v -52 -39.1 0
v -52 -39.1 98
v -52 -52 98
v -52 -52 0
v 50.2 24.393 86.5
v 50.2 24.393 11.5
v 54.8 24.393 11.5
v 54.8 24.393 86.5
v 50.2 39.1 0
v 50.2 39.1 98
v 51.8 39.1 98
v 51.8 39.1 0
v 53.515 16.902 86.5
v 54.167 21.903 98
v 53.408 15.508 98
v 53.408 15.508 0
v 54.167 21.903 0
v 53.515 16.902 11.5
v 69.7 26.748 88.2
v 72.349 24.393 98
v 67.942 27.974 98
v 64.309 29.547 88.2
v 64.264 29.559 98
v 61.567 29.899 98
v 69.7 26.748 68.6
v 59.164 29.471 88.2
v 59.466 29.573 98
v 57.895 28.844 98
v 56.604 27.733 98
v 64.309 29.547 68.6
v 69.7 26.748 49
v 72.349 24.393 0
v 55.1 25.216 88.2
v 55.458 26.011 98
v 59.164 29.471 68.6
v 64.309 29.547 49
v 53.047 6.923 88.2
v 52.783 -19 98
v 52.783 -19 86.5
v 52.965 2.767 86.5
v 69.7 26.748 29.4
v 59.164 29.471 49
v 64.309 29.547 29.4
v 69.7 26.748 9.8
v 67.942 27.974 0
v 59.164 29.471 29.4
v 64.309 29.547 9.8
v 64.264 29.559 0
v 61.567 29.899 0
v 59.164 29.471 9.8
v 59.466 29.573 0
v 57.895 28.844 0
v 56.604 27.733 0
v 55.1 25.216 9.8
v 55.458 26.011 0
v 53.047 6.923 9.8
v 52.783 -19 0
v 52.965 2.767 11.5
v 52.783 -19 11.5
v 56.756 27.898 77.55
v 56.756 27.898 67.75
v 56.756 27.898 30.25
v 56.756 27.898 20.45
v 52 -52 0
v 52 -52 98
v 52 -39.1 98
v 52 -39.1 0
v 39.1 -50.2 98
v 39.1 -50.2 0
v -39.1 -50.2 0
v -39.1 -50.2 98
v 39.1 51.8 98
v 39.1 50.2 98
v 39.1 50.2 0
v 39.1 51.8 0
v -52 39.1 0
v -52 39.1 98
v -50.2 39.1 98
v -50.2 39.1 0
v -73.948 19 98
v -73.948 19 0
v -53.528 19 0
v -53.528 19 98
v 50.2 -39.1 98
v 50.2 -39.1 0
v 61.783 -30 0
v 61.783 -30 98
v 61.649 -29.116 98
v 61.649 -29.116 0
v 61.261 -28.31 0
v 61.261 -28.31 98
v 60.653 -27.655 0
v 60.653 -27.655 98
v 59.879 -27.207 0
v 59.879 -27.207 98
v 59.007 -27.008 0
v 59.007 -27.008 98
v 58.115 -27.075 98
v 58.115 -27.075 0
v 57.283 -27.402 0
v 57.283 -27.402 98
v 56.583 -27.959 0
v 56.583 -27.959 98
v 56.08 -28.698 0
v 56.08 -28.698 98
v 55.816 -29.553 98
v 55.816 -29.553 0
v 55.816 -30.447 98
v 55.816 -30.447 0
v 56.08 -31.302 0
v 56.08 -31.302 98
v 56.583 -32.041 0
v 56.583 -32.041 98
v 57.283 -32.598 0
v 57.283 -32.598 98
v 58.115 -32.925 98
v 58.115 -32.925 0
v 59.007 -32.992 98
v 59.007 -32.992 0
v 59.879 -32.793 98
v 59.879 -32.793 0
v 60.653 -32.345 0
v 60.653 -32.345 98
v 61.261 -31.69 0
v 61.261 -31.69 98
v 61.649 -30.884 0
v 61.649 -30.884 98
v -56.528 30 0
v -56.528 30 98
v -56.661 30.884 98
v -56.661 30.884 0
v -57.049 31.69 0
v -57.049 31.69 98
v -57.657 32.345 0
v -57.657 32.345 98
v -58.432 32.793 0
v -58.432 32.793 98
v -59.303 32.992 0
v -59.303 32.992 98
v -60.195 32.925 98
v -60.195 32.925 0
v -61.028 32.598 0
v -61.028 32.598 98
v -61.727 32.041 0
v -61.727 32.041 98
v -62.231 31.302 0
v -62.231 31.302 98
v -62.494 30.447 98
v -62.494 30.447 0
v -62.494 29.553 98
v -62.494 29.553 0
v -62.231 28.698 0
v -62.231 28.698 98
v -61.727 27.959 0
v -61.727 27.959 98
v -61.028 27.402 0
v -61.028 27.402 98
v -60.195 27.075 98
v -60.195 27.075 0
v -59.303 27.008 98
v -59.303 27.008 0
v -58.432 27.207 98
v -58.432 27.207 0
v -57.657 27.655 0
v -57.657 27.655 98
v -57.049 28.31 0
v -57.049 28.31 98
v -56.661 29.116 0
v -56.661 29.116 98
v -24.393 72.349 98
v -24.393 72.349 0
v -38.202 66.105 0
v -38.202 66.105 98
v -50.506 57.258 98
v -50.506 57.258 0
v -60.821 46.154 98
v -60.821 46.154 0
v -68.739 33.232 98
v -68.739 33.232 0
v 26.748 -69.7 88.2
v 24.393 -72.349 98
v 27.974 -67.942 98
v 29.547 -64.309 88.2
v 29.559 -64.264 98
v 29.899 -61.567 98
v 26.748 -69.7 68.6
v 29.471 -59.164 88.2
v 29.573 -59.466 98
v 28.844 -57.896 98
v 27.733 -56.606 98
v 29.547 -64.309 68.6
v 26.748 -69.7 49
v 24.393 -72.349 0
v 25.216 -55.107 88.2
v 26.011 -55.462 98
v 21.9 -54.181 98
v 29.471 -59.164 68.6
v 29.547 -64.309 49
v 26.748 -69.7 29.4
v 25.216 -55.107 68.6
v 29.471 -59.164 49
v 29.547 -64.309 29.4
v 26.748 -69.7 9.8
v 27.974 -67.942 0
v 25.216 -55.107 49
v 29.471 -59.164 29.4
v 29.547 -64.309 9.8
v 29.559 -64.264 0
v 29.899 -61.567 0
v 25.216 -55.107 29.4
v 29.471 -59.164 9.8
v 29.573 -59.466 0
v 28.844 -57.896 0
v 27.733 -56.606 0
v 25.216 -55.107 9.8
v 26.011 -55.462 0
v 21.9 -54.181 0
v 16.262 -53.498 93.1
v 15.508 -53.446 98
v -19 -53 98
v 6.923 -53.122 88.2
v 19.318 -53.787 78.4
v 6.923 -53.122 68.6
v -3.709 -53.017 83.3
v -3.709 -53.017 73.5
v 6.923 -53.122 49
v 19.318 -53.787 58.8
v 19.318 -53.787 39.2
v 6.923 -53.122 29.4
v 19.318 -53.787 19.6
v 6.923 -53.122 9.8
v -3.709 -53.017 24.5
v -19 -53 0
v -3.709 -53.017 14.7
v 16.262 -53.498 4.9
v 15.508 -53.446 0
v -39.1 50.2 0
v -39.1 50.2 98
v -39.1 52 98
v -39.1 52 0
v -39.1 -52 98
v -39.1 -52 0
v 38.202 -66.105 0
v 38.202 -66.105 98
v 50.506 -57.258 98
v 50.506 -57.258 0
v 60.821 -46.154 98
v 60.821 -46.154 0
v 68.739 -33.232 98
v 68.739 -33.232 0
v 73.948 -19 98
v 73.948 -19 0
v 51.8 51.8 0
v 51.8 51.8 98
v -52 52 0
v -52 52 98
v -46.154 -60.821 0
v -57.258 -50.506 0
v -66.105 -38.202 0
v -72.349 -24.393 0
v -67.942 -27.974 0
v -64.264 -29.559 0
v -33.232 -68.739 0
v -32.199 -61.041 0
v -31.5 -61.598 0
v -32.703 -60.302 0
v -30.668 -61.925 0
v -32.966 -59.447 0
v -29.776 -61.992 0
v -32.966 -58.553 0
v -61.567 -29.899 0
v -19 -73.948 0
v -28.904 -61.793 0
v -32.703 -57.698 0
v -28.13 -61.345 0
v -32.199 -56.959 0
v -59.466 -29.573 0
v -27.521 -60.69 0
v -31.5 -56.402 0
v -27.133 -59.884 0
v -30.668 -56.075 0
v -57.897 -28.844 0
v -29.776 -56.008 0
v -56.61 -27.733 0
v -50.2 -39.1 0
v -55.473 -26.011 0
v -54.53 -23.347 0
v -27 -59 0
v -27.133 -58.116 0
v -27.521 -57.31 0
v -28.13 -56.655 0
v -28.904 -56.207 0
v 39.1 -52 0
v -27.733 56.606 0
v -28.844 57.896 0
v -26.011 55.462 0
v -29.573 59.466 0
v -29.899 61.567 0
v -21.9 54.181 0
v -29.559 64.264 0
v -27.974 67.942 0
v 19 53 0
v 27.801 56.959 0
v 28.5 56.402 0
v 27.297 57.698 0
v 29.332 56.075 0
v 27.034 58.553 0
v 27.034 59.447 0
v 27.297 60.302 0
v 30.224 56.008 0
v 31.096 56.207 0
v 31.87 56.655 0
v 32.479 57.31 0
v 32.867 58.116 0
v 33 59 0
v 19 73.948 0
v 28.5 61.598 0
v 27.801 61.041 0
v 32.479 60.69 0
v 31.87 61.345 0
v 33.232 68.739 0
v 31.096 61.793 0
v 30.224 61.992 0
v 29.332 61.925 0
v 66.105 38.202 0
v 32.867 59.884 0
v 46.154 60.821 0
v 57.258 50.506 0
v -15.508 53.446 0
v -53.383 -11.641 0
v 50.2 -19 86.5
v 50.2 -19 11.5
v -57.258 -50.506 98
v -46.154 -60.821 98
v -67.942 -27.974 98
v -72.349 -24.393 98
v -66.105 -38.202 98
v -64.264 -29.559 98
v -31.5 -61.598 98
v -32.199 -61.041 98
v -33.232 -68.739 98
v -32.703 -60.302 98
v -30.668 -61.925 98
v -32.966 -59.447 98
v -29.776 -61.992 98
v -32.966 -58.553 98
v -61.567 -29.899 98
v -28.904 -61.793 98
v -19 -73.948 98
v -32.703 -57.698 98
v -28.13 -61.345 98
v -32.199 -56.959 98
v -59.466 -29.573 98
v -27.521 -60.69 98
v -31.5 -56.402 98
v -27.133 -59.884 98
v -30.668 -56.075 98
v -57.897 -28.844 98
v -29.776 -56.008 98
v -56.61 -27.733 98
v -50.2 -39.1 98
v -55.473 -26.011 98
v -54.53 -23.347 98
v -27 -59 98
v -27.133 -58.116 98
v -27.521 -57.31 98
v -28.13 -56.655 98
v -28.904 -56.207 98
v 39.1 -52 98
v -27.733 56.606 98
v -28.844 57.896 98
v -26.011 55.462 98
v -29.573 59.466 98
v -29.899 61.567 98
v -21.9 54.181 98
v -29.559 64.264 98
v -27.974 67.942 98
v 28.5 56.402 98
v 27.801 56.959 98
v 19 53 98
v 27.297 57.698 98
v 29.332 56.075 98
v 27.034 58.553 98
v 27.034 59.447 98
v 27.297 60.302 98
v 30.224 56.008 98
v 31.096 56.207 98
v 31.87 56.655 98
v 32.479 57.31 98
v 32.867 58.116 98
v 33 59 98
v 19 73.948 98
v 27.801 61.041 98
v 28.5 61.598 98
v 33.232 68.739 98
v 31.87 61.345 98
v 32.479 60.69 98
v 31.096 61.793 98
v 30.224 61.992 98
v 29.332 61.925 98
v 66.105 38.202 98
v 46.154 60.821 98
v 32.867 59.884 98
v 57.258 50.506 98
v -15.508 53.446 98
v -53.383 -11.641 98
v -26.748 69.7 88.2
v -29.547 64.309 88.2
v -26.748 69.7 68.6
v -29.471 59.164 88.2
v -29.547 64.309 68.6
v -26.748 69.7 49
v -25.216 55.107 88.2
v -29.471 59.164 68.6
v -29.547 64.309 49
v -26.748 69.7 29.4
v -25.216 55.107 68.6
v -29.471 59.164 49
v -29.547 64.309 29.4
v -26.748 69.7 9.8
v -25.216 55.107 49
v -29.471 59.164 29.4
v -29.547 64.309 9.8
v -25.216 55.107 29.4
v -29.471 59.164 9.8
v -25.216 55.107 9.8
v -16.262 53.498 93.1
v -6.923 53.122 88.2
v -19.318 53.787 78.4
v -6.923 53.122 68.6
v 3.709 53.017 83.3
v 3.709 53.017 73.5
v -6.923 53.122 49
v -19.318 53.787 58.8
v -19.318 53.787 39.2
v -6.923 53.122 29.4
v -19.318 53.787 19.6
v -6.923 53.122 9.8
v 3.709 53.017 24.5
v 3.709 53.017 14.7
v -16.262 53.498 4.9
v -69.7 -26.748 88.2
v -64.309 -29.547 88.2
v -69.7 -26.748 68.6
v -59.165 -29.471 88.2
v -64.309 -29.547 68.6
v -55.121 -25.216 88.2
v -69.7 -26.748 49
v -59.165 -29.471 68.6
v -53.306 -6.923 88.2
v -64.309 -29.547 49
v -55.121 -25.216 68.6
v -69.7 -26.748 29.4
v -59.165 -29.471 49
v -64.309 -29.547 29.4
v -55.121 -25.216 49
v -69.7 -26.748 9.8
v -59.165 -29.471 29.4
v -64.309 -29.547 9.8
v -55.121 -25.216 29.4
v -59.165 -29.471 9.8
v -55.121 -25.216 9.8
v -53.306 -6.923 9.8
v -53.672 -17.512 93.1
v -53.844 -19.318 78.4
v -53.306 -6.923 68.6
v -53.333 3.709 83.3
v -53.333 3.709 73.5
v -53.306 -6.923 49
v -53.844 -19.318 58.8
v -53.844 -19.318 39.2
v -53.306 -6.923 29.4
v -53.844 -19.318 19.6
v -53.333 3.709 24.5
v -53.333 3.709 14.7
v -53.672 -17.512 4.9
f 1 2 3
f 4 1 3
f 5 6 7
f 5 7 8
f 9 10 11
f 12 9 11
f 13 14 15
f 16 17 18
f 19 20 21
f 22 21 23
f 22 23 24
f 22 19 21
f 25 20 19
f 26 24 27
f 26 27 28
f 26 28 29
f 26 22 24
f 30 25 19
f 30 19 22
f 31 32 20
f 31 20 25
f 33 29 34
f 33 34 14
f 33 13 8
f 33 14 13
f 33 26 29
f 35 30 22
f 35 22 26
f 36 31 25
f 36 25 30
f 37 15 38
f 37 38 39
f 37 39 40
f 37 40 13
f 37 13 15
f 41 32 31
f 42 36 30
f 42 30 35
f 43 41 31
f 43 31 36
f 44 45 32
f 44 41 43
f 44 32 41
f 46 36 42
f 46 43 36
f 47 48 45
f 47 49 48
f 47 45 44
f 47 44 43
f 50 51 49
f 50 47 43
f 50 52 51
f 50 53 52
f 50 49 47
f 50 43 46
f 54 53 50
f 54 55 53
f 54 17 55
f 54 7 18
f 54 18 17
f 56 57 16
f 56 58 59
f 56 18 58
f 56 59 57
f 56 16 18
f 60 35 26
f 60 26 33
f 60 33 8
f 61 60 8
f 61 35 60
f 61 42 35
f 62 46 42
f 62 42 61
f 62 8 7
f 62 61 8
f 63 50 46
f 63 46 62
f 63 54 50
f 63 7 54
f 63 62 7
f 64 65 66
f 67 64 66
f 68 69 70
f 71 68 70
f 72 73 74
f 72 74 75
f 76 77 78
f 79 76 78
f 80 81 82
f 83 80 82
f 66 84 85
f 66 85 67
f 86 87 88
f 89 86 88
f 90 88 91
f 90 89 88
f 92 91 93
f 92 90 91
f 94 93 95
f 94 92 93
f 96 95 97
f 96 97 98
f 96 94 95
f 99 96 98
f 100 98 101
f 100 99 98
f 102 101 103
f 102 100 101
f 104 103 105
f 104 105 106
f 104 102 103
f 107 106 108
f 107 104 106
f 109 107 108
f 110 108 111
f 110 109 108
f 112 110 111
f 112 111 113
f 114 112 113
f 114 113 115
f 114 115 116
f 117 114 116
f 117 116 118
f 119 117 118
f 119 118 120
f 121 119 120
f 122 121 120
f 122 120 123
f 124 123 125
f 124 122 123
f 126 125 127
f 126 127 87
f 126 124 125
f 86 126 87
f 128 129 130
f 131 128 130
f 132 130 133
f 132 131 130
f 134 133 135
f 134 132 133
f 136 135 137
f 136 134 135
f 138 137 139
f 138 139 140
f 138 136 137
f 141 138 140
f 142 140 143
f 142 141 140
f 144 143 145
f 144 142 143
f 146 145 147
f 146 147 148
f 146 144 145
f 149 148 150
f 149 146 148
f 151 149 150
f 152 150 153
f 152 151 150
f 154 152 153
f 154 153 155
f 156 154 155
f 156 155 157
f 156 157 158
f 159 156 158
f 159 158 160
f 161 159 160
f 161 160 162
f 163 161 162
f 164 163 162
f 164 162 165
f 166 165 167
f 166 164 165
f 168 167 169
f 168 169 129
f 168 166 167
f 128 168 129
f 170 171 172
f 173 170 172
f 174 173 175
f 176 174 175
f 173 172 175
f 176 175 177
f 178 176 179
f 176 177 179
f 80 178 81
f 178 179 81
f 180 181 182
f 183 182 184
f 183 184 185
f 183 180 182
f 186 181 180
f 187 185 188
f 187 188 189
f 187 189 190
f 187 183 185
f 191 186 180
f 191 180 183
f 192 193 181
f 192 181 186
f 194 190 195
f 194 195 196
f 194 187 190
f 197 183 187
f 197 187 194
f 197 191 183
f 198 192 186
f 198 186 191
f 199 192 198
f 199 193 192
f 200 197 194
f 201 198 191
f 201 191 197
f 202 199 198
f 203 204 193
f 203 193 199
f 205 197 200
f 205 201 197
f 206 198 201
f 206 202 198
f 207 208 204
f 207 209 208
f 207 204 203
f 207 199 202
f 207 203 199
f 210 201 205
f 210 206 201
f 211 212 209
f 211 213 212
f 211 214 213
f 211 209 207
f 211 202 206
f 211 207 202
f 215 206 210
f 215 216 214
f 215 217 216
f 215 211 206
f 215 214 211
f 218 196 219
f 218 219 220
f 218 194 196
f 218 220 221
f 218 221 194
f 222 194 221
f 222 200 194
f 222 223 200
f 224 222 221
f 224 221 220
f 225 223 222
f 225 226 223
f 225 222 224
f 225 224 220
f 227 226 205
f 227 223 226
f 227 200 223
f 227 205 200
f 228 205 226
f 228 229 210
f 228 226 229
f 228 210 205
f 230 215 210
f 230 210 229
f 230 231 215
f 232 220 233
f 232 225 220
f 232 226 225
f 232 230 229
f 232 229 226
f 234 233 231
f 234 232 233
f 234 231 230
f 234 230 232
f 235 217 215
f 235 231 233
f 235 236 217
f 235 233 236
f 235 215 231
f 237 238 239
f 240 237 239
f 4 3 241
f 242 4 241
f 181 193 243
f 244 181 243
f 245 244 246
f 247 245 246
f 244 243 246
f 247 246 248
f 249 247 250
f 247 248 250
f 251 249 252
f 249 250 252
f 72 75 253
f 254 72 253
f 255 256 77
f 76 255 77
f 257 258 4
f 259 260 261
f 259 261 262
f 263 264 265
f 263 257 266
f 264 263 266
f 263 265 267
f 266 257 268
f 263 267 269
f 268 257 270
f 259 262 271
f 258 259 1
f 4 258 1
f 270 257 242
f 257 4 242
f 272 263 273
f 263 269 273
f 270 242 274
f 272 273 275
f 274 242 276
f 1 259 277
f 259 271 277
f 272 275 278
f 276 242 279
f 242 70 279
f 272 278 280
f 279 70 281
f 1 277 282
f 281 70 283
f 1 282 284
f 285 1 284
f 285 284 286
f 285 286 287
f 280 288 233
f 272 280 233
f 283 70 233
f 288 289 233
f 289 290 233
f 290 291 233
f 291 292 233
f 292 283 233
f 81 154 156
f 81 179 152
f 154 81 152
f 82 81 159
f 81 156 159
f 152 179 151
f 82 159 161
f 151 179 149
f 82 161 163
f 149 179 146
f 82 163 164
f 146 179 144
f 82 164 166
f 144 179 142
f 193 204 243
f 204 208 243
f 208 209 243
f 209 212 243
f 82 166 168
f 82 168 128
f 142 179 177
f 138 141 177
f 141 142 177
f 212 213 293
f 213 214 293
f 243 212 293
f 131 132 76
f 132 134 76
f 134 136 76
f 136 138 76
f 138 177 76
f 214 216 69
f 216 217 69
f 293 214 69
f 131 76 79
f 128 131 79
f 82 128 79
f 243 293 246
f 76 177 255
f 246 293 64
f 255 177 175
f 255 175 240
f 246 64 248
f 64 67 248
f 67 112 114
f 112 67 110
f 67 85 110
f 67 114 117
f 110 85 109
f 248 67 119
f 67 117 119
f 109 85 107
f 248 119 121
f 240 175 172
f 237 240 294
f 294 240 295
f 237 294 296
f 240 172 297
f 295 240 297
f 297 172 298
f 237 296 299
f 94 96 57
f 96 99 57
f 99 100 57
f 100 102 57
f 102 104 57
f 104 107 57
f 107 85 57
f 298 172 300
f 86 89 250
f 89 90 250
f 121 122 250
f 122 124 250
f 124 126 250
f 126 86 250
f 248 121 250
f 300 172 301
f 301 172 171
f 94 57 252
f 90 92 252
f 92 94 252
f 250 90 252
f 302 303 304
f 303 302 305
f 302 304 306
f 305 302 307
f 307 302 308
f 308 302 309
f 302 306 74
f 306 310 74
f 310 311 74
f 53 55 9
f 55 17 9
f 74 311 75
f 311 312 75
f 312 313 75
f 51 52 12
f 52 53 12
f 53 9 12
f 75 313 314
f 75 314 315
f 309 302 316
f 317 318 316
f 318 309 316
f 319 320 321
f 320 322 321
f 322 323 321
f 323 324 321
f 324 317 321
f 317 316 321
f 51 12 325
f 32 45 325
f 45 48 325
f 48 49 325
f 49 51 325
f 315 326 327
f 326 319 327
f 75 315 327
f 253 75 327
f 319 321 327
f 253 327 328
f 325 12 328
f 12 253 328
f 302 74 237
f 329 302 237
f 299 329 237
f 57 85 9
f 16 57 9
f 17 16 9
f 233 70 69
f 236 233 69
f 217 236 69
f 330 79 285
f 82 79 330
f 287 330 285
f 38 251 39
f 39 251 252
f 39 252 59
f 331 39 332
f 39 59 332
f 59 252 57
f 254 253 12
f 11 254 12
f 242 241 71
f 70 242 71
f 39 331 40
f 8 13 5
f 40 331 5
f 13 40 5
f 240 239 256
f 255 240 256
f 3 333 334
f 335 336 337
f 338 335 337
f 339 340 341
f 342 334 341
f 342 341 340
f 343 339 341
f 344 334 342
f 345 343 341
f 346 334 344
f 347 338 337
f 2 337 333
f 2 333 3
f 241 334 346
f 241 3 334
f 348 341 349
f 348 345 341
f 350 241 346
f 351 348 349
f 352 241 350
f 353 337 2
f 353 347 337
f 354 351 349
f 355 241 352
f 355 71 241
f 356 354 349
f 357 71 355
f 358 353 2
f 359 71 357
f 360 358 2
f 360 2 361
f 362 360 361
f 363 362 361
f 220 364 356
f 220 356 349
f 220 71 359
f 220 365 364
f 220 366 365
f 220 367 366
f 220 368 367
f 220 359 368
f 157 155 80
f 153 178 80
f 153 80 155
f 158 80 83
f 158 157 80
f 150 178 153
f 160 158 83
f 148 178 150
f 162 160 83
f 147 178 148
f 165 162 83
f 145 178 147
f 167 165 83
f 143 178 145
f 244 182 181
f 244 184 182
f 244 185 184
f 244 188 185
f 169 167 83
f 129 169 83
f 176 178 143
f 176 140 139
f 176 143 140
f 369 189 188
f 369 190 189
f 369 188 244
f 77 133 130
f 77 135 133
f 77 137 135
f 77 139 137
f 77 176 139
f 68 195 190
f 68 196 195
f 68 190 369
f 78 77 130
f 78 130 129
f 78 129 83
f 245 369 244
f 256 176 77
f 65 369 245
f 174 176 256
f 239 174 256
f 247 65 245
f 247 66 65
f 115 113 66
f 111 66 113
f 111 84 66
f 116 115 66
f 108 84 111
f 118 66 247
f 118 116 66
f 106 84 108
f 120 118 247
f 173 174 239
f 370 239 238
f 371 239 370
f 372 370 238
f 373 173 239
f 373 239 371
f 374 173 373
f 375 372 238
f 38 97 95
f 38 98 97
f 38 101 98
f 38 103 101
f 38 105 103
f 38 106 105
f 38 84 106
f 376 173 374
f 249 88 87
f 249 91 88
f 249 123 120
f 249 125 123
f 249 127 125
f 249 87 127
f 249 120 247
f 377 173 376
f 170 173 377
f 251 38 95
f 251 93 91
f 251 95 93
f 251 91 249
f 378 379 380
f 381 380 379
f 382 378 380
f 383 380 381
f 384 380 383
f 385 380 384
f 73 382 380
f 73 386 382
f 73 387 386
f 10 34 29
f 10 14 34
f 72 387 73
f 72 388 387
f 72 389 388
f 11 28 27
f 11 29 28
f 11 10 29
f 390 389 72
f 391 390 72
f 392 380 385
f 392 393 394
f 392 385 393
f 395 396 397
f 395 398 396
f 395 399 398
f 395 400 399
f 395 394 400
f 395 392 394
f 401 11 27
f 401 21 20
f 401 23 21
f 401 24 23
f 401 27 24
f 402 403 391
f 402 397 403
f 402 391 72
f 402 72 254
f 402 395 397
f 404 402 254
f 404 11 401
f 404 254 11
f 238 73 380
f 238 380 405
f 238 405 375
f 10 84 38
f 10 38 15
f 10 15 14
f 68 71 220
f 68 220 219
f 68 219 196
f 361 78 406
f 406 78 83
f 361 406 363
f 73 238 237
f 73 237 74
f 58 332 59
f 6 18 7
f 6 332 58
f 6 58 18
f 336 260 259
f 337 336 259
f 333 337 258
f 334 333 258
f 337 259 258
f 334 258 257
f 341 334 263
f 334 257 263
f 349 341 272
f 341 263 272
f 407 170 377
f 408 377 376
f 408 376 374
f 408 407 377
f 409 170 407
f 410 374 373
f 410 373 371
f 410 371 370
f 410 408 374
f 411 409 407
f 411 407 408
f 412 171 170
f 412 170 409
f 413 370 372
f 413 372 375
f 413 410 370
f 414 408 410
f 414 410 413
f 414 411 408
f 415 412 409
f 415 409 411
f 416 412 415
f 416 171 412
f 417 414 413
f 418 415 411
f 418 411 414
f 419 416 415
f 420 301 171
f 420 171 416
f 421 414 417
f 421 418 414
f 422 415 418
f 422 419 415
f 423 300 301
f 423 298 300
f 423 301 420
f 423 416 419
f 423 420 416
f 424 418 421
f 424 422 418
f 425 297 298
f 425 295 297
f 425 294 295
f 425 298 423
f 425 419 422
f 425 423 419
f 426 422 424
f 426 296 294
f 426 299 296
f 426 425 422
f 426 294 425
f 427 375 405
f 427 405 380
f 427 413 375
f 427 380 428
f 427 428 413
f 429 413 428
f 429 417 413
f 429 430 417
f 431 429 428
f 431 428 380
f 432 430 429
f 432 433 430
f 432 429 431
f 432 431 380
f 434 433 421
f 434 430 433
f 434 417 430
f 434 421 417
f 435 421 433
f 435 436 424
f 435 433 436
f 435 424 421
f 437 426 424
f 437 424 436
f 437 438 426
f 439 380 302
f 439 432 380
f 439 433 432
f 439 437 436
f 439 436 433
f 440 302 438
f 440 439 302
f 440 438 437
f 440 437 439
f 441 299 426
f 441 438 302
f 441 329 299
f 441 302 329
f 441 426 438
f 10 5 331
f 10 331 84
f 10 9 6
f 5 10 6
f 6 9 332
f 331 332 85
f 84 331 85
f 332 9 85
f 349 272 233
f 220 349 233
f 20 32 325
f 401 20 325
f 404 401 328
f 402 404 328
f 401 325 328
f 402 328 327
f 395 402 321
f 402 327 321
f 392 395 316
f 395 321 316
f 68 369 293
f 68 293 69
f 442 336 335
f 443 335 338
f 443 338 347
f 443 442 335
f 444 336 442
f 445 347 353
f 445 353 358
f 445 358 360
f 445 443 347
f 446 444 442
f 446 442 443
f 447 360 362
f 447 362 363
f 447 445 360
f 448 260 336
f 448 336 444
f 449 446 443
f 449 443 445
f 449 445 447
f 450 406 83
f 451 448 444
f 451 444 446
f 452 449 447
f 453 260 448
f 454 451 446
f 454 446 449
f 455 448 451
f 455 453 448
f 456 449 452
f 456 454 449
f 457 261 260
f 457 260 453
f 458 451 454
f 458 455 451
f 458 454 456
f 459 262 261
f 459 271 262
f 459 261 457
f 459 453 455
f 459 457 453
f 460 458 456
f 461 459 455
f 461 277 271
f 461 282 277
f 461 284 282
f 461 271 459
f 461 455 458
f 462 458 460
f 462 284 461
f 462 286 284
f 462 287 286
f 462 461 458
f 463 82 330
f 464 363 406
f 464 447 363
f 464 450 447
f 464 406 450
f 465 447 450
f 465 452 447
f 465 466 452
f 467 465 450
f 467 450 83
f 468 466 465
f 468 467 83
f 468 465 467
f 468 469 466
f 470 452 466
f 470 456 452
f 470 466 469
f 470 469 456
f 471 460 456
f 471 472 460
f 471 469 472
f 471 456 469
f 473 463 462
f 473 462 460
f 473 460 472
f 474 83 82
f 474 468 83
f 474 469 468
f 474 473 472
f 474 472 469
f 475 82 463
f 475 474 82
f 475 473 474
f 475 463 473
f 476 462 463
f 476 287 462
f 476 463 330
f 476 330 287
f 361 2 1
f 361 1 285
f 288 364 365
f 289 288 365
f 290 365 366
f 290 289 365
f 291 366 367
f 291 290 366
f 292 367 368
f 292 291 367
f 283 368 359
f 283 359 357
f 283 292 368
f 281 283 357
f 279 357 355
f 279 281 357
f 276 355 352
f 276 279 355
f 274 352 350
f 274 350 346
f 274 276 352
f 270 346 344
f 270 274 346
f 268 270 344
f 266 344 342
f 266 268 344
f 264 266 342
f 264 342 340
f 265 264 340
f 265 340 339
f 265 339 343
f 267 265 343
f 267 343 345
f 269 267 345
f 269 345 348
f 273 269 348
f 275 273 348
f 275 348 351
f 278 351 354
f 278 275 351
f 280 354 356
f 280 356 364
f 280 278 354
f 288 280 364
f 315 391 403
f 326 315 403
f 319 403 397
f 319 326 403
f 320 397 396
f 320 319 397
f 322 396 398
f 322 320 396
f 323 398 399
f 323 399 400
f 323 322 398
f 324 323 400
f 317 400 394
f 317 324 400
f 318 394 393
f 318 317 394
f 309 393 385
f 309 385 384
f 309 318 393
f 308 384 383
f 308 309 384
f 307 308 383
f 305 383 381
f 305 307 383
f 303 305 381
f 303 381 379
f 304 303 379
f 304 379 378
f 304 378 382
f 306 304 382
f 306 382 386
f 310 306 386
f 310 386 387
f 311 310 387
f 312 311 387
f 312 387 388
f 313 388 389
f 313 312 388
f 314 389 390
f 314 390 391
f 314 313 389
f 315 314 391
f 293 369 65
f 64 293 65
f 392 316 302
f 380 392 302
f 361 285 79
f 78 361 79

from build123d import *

# Parameters (mm, degrees)
BOSS_EXTRUDE3_OUTLINE_R = 3
BOSS_EXTRUDE3_DEPTH     = 98
SKETCH3_R               = 3
BOSS_EXTRUDE4_DEPTH     = 5
CUT_EXTRUDE6_DEPTH      = 144.320079016
CUT_EXTRUDE6_DEPTH_BACK = 144.320079016
CUT_EXTRUDE9_DEPTH      = 98
SKETCH10_W              = 0.4
SKETCH10_H              = 1.8
SKETCH10_W_2            = 1.8
SKETCH10_H_2            = 0.4
SKETCH10_H_3            = 1.6
SKETCH10_W_3            = 1.6
BOSS_EXTRUDE5_DEPTH     = 98
SKETCH11_W              = 75
SKETCH11_H              = 43.392810524
CUT_EXTRUDE10_DEPTH     = 10


# Read off the part's stored shape, not the designer's step: Boss-Extrude3
with BuildPart() as part:
    # Boss-Extrude3 outline → Boss-Extrude3 (new body)
    with BuildSketch(Plane.XY):
        with BuildLine():
            ThreePointArc((-24.392810524, 72.348554199), (-55.939709188, 51.962211615), (-73.948106805, 19))
            Line((-73.948106805, 19), (-53.527635725, 19))
            add(Edge.make_bspline(
                [(-72.348554199, -24.392810524), (-69.541086329, -27.040667073), (-67.428574969, -29.089162938), (-64.355831171, -30.241441862), (-60.963009895, -31.073643307), (-59.042545022, -30.561519341), (-56.673971678, -29.217193929), (-54.241382838, -27.488775543), (-53, -25.105954954), (-53, -17.37432721), (-53.527635725, 19)],
                knots=[0, 0, 0, 0, 0, 0, 0, 0, 0, 0, 0, 1, 1, 1, 1, 1, 1, 1, 1, 1, 1, 1], degree=10))
            ThreePointArc((-72.348554199, -24.392810524), (-51.962211615, -55.939709188), (-19, -73.948106805))
            Line((-19, -73.948106805), (-19, -53))
            add(Edge.make_bspline(
                [(24.392810524, -72.348554199), (27.040667073, -69.541086329), (29.089162938, -67.428574969), (30.241441862, -64.355831171), (31.073643307, -60.963009895), (30.561519341, -59.042545022), (29.217193929, -56.673971678), (27.488775543, -54.241382838), (25.105954954, -53), (17.37432721, -53), (-19, -53)],
                knots=[0, 0, 0, 0, 0, 0, 0, 0, 0, 0, 0, 1, 1, 1, 1, 1, 1, 1, 1, 1, 1, 1], degree=10))
            ThreePointArc((24.392810524, -72.348554199), (55.939709188, -51.962211615), (73.948106805, -19))
            Line((73.948106805, -19), (52.782560411, -19))
            add(Edge.make_bspline(
                [(72.348554199, 24.392810524), (69.541086329, 27.040667073), (67.428574969, 29.089162938), (64.355831171, 30.241441862), (60.963009895, 31.073643307), (59.042545022, 30.561519341), (56.673971678, 29.217193929), (54.241382838, 27.488775543), (53, 25.105954954), (53, 17.37432721), (52.782560411, -19)],
                knots=[0, 0, 0, 0, 0, 0, 0, 0, 0, 0, 0, 1, 1, 1, 1, 1, 1, 1, 1, 1, 1, 1], degree=10))
            ThreePointArc((72.348554199, 24.392810524), (51.962211615, 55.939709188), (19, 73.948106805))
            Line((19, 73.948106805), (19, 53))
            add(Edge.make_bspline(
                [(-24.392810524, 72.348554199), (-27.040667073, 69.541086329), (-29.089162938, 67.428574969), (-30.241441862, 64.355831171), (-31.073643307, 60.963009895), (-30.561519341, 59.042545022), (-29.217193929, 56.673971678), (-27.488775543, 54.241382838), (-25.105954954, 53), (-17.37432721, 53), (19, 53)],
                knots=[0, 0, 0, 0, 0, 0, 0, 0, 0, 0, 0, 1, 1, 1, 1, 1, 1, 1, 1, 1, 1, 1], degree=10))
        make_face()
        with Locations((-30, -59)):
            Circle(BOSS_EXTRUDE3_OUTLINE_R, mode=Mode.SUBTRACT)
        with Locations((58.782560411, -30)):
            Circle(BOSS_EXTRUDE3_OUTLINE_R, mode=Mode.SUBTRACT)
        with Locations((-59.527635725, 30)):
            Circle(BOSS_EXTRUDE3_OUTLINE_R, mode=Mode.SUBTRACT)
        Polygon((-38.9, -51.6), (-51.6, -51.6), (-51.6, -38.9), (-50, -38.9), (-50, 38.9), (-51.6, 38.9), (-51.6, 51.6), (-38.9, 51.6), (-38.9, 50), (38.9, 50), (38.9, 51.6), (51.6, 51.6), (51.6, 38.9), (50, 38.9), (50, -38.9), (51.6, -38.9), (51.6, -51.6), (38.9, -51.6), (38.9, -50), (-38.9, -50), align=None, mode=Mode.SUBTRACT)
        with Locations((30, 59)):
            Circle(BOSS_EXTRUDE3_OUTLINE_R, mode=Mode.SUBTRACT)
    extrude(amount=BOSS_EXTRUDE3_DEPTH)

    # Sketch3 → Boss-Extrude4 (add)
    with BuildSketch(Plane.XY.offset(98)):
        with Locations((-59.527635725, 30)):
            Circle(SKETCH3_R)
    extrude(amount=BOSS_EXTRUDE4_DEPTH)


with BuildPart() as boss_extrude4_kept_piece:
    # of the separate pieces the step leaves, the one the design keeps (boss_extrude4_pieces_kept)
    add(part.part.solids().sort_by_distance((-24.392810524, 72.348554199, 0))[0])

    # Sketch5 → Cut-Extrude6 (cut, two sides: drawn at the far end of the back side and taken through both)
    with BuildSketch(Plane.XY.offset(98).offset(-CUT_EXTRUDE6_DEPTH_BACK)):
        Polygon((38.7, 51.8), (51.8, 51.8), (51.8, 38.7), (50.2, 38.7), (50.2, -38.7), (51.8, -38.7), (51.8, -51.8), (38.7, -51.8), (38.7, -50.2), (-38.7, -50.2), (-38.7, -51.8), (-51.8, -51.8), (-51.8, -38.7), (-50.2, -38.7), (-50.2, 38.7), (-51.8, 38.7), (-51.8, 51.8), (-38.7, 51.8), (-38.7, 50.2), (38.7, 50.2), align=None)
        Polygon((-38.9, -51.6), (-51.6, -51.6), (-51.6, -38.9), (-50, -38.9), (-50, 38.9), (-51.6, 38.9), (-51.6, 51.6), (-38.9, 51.6), (-38.9, 50), (38.9, 50), (38.9, 51.6), (51.6, 51.6), (51.6, 38.9), (50, 38.9), (50, -38.9), (51.6, -38.9), (51.6, -51.6), (38.9, -51.6), (38.9, -50), (-38.9, -50), align=None, mode=Mode.SUBTRACT)
    extrude(amount=CUT_EXTRUDE6_DEPTH + CUT_EXTRUDE6_DEPTH_BACK, mode=Mode.SUBTRACT)

    # Sketch6 → Cut-Extrude9 (cut)
    with BuildSketch(Plane.XY.offset(98)):
        Polygon((-51.8, 38.7), (-51.8, 51.8), (-38.7, 51.8), (-38.7, 52), (-52, 52), (-52, 38.7), align=None)
        Polygon((-38.7, -51.8), (-51.8, -51.8), (-51.8, -38.7), (-52, -38.7), (-52, -52), (-38.7, -52), align=None)
        Polygon((51.8, -38.7), (51.8, -51.8), (38.7, -51.8), (38.7, -52), (52, -52), (52, -38.7), align=None)
        Polygon((51.8, 38.7), (51.8, 51.8), (38.7, 51.8), (38.7, 51.6), (51.6, 51.6), (51.6, 38.7), align=None)
    extrude(amount=-CUT_EXTRUDE9_DEPTH, mode=Mode.SUBTRACT)

    # Sketch10 → Boss-Extrude5 (add)
    with BuildSketch(Plane.XY.offset(98)):
        with Locations((-38.9, 51.1)):
            Rectangle(SKETCH10_W, SKETCH10_H)
        with Locations((-51.1, 38.9)):
            Rectangle(SKETCH10_W_2, SKETCH10_H_2)
        with Locations((38.9, 51)):
            Rectangle(SKETCH10_W, SKETCH10_H_3)
        with Locations((51, 38.9)):
            Rectangle(SKETCH10_W_3, SKETCH10_H_2)
        with Locations((51.1, -38.9)):
            Rectangle(SKETCH10_W_2, SKETCH10_H_2)
        with Locations((38.9, -51.1)):
            Rectangle(SKETCH10_W, SKETCH10_H)
        with Locations((-51.1, -38.9)):
            Rectangle(SKETCH10_W_2, SKETCH10_H_2)
        with Locations((-38.9, -51.1)):
            Rectangle(SKETCH10_W, SKETCH10_H)
    extrude(amount=-BOSS_EXTRUDE5_DEPTH)

    # Sketch11 → Cut-Extrude10 (cut)
    with BuildSketch(Plane.ZY.offset(-50.2)):
        with Locations((49, 2.696405262)):
            Rectangle(SKETCH11_W, SKETCH11_H)
    extrude(amount=-CUT_EXTRUDE10_DEPTH, mode=Mode.SUBTRACT)


solid = boss_extrude4_kept_piece.part
